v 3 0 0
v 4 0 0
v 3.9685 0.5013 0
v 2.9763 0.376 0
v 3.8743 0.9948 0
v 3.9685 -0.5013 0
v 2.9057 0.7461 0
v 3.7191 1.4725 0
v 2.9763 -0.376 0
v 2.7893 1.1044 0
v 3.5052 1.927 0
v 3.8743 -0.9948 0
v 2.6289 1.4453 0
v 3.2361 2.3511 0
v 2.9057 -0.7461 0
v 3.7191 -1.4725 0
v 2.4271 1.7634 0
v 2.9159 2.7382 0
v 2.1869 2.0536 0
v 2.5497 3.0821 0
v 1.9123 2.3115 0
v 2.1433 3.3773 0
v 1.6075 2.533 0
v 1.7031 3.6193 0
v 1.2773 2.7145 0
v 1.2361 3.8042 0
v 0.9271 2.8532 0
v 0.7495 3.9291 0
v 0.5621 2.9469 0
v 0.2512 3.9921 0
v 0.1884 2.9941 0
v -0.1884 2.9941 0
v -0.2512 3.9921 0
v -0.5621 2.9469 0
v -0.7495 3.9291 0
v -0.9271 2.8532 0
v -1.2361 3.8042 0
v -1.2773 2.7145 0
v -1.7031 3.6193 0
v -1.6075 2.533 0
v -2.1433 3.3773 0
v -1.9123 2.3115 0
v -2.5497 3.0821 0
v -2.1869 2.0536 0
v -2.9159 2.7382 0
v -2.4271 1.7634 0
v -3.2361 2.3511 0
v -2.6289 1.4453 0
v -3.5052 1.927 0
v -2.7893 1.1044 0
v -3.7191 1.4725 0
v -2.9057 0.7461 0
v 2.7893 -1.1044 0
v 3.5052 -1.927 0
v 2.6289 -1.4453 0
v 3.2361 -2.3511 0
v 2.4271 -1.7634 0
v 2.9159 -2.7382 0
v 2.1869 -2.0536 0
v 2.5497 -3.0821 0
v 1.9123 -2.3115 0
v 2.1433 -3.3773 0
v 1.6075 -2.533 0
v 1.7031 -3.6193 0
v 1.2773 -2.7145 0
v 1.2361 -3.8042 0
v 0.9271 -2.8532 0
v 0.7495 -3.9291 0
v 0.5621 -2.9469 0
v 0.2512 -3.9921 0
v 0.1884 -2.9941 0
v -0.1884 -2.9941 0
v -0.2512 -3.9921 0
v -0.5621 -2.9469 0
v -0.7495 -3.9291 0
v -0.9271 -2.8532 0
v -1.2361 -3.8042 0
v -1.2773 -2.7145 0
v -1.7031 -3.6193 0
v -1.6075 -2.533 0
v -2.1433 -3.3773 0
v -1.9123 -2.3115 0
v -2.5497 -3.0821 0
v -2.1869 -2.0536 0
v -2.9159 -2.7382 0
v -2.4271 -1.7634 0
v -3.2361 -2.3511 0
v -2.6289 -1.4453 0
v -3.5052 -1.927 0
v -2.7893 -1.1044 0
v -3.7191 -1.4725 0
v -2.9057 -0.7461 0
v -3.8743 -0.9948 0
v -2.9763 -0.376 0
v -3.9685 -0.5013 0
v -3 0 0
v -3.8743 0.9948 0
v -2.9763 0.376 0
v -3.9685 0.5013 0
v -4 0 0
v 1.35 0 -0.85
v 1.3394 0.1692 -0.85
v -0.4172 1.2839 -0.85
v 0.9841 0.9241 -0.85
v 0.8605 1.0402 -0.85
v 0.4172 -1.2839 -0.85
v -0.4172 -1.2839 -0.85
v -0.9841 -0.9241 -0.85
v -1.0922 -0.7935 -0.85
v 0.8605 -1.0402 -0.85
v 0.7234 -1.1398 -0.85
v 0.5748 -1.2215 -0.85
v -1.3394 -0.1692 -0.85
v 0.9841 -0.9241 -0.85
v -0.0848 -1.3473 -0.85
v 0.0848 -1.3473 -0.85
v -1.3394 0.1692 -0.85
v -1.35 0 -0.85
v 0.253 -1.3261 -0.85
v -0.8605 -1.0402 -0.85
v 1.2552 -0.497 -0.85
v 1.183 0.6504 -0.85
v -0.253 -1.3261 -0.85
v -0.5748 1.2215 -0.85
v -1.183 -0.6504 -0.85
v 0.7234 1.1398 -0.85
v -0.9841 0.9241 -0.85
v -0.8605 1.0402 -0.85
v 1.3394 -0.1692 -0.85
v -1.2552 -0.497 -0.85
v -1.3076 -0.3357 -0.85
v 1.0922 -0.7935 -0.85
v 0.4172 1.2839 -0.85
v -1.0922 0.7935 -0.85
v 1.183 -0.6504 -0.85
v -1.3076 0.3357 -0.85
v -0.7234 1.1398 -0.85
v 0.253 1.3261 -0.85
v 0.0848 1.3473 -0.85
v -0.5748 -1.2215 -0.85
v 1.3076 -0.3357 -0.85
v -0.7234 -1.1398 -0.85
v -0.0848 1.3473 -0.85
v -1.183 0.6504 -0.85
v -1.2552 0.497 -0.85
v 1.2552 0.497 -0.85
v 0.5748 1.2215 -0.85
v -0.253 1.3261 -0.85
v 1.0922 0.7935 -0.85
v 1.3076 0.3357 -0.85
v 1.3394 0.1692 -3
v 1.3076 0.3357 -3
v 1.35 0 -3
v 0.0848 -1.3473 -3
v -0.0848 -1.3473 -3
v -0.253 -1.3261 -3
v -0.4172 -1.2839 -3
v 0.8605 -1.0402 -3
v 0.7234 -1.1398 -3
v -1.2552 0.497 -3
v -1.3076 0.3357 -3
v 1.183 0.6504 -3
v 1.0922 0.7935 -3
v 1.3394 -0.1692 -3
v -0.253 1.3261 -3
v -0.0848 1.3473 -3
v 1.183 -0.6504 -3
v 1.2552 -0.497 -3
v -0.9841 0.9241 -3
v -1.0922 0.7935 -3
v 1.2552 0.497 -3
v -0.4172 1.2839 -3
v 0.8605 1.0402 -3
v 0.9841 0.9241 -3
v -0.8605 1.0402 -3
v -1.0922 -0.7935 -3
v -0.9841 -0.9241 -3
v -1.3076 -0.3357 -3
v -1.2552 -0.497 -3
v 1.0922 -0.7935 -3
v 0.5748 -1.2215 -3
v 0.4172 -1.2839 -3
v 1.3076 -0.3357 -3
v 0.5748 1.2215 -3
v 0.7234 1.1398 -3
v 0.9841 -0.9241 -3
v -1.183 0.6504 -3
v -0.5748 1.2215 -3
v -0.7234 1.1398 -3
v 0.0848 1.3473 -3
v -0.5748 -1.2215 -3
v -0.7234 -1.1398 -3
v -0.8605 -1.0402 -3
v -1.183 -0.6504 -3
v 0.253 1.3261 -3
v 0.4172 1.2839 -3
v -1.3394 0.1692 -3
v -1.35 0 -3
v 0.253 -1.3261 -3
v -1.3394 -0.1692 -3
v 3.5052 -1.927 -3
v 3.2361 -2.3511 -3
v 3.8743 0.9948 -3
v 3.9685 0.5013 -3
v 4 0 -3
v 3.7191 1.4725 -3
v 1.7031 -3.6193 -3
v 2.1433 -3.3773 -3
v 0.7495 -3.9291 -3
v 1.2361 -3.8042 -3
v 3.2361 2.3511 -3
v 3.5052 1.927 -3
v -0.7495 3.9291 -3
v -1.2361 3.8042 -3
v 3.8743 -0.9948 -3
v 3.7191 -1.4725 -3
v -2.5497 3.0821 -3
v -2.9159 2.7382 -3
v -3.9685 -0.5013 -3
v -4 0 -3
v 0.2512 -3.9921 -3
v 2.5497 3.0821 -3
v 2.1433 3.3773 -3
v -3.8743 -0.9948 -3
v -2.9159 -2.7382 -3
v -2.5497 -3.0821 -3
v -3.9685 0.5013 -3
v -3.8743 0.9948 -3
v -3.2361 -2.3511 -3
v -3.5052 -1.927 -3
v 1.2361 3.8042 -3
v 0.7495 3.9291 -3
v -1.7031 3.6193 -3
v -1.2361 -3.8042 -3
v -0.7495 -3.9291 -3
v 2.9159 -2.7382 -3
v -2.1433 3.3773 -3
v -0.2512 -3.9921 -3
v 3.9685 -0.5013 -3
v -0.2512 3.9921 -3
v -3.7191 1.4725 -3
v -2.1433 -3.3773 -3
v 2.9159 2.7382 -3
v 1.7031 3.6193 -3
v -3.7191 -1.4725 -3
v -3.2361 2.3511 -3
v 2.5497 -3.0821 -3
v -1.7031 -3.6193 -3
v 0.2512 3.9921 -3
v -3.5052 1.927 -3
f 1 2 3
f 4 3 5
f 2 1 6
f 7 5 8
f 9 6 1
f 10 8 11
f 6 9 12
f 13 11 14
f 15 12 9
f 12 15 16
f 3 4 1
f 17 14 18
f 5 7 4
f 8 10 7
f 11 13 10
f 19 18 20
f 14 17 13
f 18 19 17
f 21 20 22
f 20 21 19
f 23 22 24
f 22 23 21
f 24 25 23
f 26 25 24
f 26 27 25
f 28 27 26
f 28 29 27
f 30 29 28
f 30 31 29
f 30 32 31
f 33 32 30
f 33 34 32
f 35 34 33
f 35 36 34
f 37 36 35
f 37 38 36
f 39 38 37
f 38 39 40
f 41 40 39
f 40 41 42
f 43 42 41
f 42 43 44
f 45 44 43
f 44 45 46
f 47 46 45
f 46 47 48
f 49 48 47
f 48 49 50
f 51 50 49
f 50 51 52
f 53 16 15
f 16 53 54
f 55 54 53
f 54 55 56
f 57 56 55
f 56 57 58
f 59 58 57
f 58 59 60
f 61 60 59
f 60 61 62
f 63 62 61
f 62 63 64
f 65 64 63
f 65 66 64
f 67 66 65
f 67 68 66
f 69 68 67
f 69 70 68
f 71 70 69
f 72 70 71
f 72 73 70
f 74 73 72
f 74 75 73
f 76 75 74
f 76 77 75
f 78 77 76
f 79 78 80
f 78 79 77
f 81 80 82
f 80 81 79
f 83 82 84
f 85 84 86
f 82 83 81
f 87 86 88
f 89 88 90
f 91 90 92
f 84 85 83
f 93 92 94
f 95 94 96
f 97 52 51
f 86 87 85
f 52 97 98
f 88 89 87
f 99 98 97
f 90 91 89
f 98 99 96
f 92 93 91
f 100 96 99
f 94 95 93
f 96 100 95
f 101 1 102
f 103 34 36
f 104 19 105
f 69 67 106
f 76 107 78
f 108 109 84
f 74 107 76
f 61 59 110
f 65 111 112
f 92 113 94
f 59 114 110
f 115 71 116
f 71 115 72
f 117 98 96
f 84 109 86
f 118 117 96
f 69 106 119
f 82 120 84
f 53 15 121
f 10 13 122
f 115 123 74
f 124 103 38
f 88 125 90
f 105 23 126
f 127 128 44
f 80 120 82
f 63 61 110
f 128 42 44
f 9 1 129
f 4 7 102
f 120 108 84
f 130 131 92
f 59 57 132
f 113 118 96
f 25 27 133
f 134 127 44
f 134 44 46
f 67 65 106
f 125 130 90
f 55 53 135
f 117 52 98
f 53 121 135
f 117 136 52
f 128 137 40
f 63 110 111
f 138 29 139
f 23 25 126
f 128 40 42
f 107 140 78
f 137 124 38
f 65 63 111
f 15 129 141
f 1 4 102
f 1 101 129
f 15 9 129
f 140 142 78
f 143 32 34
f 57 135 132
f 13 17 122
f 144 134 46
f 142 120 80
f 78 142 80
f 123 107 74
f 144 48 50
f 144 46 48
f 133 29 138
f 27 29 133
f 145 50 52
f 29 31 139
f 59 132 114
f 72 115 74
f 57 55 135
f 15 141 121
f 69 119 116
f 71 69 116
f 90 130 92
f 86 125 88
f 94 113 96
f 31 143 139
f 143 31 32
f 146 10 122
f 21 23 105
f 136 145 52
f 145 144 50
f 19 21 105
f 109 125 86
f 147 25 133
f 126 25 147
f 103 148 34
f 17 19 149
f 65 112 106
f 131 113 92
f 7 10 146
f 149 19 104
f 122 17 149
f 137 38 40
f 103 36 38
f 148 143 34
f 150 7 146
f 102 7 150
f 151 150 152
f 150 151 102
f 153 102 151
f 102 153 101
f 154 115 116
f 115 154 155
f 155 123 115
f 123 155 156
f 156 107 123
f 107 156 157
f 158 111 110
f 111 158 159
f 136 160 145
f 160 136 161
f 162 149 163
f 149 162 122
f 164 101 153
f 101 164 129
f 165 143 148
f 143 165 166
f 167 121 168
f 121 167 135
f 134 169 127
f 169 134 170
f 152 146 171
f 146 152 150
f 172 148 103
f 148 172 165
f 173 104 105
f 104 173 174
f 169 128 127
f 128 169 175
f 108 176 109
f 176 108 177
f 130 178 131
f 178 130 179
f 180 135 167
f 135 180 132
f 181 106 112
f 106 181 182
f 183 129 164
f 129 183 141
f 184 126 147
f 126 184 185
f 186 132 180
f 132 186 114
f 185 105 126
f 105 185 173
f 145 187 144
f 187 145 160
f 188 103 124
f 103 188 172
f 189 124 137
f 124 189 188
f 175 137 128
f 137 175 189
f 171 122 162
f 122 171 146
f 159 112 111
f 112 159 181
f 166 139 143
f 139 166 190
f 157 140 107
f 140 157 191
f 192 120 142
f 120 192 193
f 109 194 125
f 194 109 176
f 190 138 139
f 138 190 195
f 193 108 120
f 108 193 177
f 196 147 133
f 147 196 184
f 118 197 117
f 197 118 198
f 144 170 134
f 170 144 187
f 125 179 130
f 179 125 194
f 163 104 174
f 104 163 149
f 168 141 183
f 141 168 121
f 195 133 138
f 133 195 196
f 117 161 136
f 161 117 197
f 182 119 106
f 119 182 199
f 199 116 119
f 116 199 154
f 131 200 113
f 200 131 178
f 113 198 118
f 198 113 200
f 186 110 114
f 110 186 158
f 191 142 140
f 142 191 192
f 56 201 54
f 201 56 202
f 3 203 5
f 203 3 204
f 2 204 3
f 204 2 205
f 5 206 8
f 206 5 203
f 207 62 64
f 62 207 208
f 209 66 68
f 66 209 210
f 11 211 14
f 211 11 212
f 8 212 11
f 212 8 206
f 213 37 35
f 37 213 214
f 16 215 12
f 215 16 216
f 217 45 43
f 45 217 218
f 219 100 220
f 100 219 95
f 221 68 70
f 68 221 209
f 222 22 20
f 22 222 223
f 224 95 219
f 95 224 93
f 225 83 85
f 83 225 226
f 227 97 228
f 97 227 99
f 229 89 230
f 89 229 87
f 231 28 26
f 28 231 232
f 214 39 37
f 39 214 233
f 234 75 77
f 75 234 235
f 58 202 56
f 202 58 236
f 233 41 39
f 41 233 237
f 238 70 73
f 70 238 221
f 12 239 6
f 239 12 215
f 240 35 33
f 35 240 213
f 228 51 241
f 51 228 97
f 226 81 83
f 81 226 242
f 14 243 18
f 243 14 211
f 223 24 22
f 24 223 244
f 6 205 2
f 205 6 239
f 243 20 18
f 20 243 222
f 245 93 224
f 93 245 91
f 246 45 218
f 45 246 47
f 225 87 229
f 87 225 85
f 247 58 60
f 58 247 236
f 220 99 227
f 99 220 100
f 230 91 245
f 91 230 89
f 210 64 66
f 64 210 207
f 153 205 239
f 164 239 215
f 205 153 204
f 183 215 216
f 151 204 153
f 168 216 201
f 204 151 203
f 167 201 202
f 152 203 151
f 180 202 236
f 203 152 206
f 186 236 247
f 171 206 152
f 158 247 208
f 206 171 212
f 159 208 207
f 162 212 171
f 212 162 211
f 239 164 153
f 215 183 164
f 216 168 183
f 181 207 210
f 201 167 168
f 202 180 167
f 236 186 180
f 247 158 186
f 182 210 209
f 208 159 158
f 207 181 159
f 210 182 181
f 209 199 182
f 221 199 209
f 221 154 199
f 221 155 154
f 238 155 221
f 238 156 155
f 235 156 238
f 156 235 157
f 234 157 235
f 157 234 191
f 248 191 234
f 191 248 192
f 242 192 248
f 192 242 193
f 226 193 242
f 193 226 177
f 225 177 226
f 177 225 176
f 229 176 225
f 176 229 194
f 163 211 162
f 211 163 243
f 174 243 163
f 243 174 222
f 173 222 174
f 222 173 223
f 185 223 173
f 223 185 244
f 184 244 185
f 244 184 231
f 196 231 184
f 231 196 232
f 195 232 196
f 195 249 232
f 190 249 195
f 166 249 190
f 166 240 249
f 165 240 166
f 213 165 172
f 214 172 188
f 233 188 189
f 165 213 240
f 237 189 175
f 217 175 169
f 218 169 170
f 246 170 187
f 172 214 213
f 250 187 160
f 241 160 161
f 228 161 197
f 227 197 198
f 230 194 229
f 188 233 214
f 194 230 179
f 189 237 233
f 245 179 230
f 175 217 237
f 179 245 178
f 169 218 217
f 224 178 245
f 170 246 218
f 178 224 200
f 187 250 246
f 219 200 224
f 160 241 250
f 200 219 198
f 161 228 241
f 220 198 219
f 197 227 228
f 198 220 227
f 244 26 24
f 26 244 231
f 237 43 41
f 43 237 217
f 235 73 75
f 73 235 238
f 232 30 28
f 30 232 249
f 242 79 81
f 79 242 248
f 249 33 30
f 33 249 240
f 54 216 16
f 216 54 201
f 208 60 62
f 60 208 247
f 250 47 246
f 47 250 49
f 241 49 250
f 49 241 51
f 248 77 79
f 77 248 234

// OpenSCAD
$fn = 50;

difference() {
	union() {
		translate(v = [0, 0, -3.0]) {
			cylinder(h = 3, r = 4.0);
		}
	}
	union() {
		translate(v = [0, 0, 0]) {
			rotate(a = [0, 0, 0]) {
				difference() {
					union() {
						translate(v = [0, 0, -6.0]) {
							cylinder(h = 6, r = 1.0);
						}
						translate(v = [0, 0, -0.85]) {
							cylinder(h = 0.85, r1 = 1.35, r2 = 3.0);
						}
						translate(v = [0, 0, -6.0]) {
							cylinder(h = 6, r = 1.35);
						}
						translate(v = [0, 0, -6.0]) {
							cylinder(h = 6, r = 1.0);
						}
					}
					union();
				}
			}
		}
	}
}
